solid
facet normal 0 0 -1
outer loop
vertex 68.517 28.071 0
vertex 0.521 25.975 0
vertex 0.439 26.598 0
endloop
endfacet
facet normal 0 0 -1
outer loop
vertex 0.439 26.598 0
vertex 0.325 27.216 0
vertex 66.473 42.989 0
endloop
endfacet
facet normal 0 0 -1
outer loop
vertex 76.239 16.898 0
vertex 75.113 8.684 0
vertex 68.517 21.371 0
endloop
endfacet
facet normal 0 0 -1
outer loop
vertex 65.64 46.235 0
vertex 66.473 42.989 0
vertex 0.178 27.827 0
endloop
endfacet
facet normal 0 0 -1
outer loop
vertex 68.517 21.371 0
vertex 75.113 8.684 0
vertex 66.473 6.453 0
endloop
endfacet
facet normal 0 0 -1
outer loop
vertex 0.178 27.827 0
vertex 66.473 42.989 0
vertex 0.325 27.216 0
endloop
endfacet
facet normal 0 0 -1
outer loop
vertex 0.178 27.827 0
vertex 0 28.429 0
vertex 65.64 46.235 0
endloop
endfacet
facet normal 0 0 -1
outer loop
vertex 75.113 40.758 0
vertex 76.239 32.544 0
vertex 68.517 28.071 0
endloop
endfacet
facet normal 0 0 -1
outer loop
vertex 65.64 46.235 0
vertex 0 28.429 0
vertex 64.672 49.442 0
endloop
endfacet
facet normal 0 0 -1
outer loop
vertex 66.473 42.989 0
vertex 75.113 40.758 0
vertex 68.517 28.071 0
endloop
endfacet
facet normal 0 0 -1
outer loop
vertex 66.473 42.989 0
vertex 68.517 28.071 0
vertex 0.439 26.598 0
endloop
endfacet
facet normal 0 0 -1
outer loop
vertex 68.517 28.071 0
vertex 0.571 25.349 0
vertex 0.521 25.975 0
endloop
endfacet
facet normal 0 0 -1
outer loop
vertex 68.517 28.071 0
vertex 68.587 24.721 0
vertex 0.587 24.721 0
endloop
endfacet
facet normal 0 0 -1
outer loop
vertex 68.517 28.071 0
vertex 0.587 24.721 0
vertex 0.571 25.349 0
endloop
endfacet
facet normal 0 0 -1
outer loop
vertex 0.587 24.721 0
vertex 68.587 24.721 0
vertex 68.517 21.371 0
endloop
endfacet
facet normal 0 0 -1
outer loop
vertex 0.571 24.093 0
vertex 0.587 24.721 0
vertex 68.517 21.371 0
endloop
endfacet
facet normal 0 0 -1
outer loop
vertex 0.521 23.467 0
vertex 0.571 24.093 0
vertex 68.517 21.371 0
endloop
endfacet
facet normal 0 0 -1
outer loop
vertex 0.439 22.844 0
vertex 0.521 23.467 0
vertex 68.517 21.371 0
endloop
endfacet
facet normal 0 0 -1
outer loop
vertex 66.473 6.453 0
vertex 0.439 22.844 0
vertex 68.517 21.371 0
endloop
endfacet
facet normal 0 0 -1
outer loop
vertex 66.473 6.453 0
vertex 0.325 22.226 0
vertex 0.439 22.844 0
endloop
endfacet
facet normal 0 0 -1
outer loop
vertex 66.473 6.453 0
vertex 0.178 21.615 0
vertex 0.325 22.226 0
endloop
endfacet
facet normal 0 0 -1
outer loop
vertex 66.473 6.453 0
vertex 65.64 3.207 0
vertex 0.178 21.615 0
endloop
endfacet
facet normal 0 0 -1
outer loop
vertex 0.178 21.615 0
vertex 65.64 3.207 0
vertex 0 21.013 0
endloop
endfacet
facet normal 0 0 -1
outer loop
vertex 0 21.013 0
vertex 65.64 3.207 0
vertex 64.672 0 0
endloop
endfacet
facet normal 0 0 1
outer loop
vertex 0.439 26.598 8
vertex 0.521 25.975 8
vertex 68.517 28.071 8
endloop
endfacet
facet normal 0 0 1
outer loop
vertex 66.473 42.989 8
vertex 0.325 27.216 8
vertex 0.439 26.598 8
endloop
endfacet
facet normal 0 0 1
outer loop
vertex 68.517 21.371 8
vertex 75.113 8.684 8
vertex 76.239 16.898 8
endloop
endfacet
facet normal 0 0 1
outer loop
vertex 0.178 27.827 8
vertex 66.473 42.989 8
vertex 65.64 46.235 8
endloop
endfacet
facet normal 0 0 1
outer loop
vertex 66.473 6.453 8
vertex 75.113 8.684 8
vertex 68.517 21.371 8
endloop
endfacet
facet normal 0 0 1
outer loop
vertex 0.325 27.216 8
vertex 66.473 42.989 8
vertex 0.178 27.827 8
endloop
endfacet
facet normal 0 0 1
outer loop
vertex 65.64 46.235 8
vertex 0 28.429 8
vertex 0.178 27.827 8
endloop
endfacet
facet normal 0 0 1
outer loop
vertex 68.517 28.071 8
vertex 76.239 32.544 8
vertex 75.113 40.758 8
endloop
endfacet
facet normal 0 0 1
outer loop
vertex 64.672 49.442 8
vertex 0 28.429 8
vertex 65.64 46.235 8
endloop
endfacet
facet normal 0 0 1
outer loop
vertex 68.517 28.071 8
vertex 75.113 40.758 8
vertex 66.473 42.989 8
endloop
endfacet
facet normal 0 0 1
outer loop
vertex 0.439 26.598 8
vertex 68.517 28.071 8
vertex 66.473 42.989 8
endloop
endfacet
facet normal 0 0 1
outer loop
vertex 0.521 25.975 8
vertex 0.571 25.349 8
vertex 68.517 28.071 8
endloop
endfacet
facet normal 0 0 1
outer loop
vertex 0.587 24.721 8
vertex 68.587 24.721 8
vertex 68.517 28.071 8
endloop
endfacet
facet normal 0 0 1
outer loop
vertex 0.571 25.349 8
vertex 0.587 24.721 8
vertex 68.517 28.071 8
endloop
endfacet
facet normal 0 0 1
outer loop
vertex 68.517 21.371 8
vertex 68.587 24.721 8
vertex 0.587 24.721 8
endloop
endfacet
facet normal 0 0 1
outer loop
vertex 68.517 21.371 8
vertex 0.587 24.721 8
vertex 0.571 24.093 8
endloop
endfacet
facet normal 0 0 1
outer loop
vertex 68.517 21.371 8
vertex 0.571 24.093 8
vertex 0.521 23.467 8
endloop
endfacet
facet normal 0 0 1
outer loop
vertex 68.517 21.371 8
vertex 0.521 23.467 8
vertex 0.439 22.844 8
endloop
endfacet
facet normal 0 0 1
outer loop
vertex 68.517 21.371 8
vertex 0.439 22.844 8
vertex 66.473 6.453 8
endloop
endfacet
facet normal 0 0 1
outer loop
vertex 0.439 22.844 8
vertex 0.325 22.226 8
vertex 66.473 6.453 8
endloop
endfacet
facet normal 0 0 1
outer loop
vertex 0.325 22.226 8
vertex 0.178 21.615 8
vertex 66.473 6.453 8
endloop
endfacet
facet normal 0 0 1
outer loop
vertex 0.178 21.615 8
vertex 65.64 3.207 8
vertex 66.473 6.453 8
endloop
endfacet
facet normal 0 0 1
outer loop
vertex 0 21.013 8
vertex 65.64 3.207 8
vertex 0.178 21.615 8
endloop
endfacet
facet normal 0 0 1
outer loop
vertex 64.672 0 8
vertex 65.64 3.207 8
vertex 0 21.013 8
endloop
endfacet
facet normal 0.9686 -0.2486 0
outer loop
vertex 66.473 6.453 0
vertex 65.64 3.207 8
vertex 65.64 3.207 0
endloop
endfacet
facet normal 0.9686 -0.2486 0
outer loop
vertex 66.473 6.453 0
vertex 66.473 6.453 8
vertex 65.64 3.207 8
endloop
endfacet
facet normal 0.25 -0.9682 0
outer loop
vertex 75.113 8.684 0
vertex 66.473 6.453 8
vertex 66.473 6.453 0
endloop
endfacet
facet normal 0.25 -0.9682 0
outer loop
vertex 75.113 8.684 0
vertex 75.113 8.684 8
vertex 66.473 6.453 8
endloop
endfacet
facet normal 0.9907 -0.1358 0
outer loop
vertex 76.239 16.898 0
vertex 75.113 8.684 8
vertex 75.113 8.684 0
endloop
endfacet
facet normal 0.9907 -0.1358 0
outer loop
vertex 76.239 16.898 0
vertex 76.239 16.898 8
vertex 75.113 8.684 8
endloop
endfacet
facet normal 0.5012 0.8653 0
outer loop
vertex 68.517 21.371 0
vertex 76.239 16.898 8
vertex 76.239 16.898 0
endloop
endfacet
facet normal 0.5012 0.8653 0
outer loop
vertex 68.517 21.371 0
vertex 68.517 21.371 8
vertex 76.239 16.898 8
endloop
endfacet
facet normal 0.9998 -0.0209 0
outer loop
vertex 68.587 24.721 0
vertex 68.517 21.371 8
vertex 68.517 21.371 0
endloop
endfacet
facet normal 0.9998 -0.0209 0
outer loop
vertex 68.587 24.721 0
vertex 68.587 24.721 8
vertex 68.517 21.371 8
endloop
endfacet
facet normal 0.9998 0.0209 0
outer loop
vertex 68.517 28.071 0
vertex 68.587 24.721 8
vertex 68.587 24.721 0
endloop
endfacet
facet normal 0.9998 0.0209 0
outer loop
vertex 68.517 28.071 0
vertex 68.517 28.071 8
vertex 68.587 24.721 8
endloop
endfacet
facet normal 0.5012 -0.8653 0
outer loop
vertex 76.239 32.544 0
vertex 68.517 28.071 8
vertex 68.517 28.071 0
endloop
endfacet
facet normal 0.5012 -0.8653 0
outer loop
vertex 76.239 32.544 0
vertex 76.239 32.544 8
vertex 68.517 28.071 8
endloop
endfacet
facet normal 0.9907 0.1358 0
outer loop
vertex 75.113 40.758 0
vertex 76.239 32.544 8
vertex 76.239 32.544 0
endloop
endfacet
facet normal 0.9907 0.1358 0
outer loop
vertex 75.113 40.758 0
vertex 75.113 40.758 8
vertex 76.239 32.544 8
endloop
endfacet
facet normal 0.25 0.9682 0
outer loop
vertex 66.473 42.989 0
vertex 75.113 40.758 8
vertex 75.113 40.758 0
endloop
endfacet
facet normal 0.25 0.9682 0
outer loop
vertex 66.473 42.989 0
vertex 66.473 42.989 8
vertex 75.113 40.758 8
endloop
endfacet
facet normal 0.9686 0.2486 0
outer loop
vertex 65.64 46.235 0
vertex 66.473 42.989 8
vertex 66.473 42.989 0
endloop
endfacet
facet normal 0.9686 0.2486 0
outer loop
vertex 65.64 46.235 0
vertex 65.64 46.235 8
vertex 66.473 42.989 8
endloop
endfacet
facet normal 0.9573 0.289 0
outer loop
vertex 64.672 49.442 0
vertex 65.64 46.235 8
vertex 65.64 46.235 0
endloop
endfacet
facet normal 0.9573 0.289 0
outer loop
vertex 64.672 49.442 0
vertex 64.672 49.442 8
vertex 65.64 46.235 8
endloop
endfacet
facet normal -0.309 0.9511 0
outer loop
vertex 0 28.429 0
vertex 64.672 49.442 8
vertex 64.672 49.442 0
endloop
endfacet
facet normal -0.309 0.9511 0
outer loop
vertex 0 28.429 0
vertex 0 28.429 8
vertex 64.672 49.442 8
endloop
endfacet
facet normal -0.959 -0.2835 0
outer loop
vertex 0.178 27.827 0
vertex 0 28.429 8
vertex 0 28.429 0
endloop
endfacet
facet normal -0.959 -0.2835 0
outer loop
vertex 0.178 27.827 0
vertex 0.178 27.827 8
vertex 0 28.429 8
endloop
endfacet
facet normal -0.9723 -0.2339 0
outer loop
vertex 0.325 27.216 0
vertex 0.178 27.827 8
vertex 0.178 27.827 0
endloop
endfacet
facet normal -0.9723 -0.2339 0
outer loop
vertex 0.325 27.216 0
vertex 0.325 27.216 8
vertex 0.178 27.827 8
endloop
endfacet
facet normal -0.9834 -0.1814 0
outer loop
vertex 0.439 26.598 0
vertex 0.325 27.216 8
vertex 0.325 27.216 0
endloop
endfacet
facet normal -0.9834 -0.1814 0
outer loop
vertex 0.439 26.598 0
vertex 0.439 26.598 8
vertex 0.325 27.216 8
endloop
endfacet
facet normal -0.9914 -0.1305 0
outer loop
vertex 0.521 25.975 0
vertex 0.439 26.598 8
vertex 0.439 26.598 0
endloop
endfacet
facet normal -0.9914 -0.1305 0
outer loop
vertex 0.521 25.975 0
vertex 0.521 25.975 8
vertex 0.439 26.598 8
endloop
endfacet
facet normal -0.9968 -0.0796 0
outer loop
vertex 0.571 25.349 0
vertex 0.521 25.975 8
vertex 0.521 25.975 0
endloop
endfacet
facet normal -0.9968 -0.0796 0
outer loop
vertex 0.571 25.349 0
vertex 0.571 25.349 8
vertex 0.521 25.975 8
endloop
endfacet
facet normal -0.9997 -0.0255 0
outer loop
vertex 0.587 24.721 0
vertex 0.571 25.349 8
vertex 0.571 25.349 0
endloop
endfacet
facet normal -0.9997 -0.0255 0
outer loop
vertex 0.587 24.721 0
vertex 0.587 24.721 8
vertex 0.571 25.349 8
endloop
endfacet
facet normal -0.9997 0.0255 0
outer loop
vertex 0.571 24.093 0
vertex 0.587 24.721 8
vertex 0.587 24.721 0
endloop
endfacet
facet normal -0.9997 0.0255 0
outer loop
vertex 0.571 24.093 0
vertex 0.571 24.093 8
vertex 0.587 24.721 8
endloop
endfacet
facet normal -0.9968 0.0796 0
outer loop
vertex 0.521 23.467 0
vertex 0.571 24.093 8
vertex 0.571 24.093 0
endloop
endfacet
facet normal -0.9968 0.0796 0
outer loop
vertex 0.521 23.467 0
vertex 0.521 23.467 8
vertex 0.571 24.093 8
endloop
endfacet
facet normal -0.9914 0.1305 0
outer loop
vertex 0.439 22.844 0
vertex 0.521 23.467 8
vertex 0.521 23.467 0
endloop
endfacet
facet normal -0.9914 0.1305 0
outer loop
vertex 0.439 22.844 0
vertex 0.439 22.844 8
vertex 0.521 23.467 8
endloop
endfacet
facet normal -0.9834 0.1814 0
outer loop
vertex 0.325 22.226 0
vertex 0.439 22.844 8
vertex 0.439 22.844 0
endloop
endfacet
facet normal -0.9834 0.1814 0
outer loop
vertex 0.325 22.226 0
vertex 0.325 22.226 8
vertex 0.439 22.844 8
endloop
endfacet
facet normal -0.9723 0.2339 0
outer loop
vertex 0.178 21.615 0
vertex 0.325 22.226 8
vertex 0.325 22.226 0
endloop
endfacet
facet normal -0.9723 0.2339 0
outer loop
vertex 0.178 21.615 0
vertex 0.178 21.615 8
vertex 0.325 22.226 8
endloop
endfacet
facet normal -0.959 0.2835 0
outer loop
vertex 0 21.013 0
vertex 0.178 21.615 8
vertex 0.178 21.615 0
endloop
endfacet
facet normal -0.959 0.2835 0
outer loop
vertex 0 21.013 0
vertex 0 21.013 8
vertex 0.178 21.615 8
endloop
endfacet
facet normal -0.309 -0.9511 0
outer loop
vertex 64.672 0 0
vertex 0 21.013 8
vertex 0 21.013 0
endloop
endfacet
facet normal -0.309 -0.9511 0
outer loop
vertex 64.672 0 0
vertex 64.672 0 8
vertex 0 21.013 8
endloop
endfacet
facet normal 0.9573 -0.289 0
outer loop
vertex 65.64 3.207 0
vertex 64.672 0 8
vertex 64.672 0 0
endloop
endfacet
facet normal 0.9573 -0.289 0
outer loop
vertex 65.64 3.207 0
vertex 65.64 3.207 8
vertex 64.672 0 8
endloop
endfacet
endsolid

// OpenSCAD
$fn = 32;

// ----------------------------------------------------------------------
// Gear sector: 2 teeth on 36 degrees
// ----------------------------------------------------------------------

// --- parameters (mm) ---
sector_angle = 36;        // sector angle, degrees
root_r = 80;              // root circle radius
tooth_h = 8;              // tooth height over the root circle
teeth = 2;                // number of teeth on the sector
hub_r = 12;               // hub bore radius
plate_t = 8;              // sector thickness, Z
arc_step = 3;             // sampling step of the root/hub arcs, degrees

tip_r = root_r + tooth_h;  // tip circle radius

profile = [[64.672, 0], [65.64, 3.207], [66.473, 6.453], [75.113, 8.684], [76.239, 16.898], [68.517, 21.371], [68.587, 24.721], [68.517, 28.071], [76.239, 32.544], [75.113, 40.758], [66.473, 42.989], [65.64, 46.235], [64.672, 49.442], [0, 28.429], [0.178, 27.827], [0.325, 27.216], [0.439, 26.598], [0.521, 25.975], [0.571, 25.349], [0.587, 24.721], [0.571, 24.093], [0.521, 23.467], [0.439, 22.844], [0.325, 22.226], [0.178, 21.615], [0, 21.013]];  // primary outline, 26 points, counter clockwise

// --- the one profile operation ---
linear_extrude(height = plate_t) polygon(points = profile);
